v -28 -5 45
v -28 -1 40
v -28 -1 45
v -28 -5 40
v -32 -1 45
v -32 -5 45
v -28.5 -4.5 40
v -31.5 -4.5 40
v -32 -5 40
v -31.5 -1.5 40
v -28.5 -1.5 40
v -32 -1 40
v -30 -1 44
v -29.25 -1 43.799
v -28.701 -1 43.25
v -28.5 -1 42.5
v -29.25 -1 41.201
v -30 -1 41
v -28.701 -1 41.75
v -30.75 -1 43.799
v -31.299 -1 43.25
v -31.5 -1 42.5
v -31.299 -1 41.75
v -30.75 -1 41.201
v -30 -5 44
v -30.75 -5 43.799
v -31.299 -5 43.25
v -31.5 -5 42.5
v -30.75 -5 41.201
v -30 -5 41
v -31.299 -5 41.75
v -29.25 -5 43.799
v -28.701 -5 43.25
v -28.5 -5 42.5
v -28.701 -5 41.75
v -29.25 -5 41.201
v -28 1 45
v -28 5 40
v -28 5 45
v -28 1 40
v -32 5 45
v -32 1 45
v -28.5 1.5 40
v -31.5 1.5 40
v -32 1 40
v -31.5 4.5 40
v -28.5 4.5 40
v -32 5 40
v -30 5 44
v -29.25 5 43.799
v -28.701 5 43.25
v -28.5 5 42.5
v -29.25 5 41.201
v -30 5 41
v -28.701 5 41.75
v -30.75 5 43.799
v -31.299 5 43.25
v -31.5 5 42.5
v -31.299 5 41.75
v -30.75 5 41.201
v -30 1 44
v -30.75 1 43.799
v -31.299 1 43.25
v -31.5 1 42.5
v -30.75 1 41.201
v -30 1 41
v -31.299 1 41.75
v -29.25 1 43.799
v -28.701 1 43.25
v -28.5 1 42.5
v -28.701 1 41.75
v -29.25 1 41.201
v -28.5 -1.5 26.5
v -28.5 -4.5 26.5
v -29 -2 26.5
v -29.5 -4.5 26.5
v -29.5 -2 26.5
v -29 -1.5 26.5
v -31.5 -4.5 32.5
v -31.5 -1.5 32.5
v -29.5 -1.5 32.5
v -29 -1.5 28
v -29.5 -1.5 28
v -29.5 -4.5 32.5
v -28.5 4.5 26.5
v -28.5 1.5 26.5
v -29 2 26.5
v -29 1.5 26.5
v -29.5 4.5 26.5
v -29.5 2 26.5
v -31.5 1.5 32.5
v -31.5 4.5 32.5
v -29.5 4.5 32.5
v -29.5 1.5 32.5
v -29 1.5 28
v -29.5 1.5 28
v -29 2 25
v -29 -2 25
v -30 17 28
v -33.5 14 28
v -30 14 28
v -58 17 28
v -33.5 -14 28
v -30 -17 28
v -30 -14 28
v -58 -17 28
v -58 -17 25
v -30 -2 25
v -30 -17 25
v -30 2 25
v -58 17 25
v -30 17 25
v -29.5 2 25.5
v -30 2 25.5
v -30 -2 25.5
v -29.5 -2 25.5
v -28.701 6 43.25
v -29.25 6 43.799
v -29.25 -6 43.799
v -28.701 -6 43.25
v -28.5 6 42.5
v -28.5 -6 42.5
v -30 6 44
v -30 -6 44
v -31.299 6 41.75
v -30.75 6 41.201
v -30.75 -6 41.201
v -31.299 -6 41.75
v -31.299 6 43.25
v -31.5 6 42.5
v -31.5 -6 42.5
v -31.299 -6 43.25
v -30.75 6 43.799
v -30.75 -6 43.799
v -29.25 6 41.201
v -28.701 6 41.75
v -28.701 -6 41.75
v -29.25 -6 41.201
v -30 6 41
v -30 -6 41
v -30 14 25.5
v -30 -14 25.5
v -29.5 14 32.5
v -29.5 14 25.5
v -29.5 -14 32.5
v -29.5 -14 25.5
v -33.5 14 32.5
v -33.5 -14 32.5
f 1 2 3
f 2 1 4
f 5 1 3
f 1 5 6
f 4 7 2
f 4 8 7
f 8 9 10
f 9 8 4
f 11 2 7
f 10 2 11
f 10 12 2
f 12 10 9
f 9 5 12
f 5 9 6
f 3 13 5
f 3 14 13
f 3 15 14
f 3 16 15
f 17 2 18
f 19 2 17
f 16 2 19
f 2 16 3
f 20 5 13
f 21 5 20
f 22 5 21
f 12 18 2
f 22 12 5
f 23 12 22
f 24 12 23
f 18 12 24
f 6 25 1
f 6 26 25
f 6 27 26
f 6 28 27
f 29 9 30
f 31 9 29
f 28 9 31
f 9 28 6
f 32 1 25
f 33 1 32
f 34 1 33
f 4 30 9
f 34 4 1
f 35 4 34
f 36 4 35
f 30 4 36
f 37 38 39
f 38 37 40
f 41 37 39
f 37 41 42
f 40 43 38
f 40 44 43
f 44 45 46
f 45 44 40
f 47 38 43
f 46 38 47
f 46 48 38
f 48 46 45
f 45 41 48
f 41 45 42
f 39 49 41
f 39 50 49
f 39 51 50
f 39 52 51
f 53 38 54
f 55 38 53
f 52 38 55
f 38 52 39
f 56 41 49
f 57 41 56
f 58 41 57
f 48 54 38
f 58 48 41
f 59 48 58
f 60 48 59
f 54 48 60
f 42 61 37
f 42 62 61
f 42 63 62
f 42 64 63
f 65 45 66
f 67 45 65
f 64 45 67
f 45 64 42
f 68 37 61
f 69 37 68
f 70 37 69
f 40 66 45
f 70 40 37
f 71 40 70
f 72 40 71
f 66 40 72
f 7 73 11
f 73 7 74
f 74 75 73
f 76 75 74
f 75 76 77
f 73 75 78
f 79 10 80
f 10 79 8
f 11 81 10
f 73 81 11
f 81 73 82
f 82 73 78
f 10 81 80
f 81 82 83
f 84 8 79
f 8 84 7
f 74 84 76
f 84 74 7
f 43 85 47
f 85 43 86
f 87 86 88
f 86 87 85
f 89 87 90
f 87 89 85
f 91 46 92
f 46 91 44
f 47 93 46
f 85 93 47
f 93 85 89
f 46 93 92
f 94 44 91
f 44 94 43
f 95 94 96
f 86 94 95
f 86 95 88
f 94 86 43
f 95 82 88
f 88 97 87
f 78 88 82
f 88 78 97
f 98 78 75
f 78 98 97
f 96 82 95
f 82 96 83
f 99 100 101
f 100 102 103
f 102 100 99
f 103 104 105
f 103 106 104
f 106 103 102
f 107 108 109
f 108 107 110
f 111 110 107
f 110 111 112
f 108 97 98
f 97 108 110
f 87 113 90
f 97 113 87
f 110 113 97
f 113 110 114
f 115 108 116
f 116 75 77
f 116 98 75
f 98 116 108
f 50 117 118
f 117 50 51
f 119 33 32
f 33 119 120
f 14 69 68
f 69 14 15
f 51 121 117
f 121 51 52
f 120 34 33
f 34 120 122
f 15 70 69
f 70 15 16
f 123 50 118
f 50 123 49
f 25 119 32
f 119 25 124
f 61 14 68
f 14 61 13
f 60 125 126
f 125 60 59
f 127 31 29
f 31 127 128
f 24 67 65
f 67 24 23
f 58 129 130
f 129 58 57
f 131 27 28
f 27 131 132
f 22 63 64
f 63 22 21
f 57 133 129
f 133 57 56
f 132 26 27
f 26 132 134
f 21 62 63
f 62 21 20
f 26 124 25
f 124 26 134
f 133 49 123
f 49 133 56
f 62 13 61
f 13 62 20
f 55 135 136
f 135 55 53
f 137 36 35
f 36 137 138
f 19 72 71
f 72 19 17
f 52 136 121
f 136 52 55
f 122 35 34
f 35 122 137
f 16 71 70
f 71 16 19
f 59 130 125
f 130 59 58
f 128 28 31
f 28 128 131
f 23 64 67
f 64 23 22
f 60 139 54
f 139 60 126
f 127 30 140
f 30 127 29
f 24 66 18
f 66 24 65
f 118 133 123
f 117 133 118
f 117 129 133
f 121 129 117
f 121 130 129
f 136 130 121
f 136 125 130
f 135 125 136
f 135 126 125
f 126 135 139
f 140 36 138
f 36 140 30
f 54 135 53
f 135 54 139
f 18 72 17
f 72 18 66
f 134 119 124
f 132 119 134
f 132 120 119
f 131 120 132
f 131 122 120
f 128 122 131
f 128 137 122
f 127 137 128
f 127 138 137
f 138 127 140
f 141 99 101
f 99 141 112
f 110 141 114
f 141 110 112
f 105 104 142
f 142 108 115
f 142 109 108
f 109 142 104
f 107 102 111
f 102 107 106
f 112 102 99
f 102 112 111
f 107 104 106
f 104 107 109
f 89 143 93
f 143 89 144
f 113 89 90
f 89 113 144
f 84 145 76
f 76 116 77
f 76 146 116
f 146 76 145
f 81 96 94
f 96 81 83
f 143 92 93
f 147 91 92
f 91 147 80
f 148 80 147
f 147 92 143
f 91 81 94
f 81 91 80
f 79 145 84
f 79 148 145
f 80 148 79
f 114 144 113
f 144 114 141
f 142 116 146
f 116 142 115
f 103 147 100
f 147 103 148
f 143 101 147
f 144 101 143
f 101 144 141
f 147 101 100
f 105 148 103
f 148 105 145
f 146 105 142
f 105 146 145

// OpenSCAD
// file: utils.scad
include <parameters.scad>

module beamBetween(p1, p2, width, height) {
    dx = p2[0] - p1[0];
    dz = p2[2] - p1[2];
    length = sqrt(dx * dx + dz * dz);
    angle = atan2(dz, dx);

    translate([(p1[0] + p2[0]) / 2, (p1[1] + p2[1]) / 2, (p1[2] + p2[2]) / 2])
        rotate([0, -angle, 0])
            cube([length, width, height], center = true);
}
// file: footrest.scad
include <parameters.scad>
use <utils.scad>

//================ FOOTREST =================//
// Folding footrest: one continuous aluminum plate hinged at the end of the
// L-bracket arm. Lightweight aluminum construction.

module footrest() {
    halfL = footrestLength / 2;
    cx = footrestFrontX;
    cz = footrestHeight - footrestThickness / 2;

    // Clevis wings at the end of the L-bracket arm.
    for (side = [-1, 1])
        color(matDarkSteel)
            translate([footPivotX, side * 3, footPivotZ])
                cube([4, 4, footrestThickness + 2], center = true);

    // Vertical brackets from arm down to the plate. Aluminum.
    bracketH = footPivotZ - cz;
    for (side = [-1, 1])
        color(matAluminum)
            translate([footPivotX, side * 3, (footPivotZ + cz) / 2])
                cube([3, 3, bracketH], center = true);

    // Folding cleat behind the plate rear edge.
    color(matAluminum)
        translate([cx + halfL - 2, 0, cz])
            cube([6, 4, footrestThickness], center = true);

    // Pivot pin through cleat and wings.
    color(matChrome)
        translate([footPivotX, 0, footPivotZ])
            rotate([90, 0, 0])
                cylinder(r = 1.5, h = 12, center = true, $fn = 12);

    // Plate — aluminum.
    color(matAluminum)
        translate([cx, 0, cz])
            cube([footrestLength, footrestWidth, footrestThickness], center = true);

    // Optional heel guard.
    if (footHeelGuard)
        color(matAluminum)
            translate([cx + halfL - 1.5, 0, cz + 2.5])
                cube([4, footrestWidth - 6, 7], center = true);

    // Optional toe guard.
    if (footToeGuard)
        color(matAluminum)
            translate([cx - halfL + 1.5, 0, cz + 3])
                cube([4, footrestWidth - 4, 8], center = true);
}
// file: parameters.scad
// Shared parameters for tracked wheelchair prototype
// NOTE: 1 unit = 1 cm (seat target 450 mm = 45 units above ground).
$fn = 48;

//================ MATERIALS =================//
// Frame: aluminum 6061-T6 (lightweight)
// Seat: carbon fiber T700 + honeycomb (ultralight)
// Suspension: rubber bushings (lightweight)
// Axles: aluminum 7075-T6 (1/3 weight of steel)
matSteel      = [0.35, 0.36, 0.38];   // hardware / fasteners only
matDarkSteel  = [0.25, 0.26, 0.28];
matRubber     = [0.12, 0.12, 0.14];   // track belt + bushings
matAluminum   = [0.55, 0.57, 0.60];   // primary frame material
matChrome     = [0.70, 0.72, 0.75];
matCarbon     = [0.15, 0.15, 0.18];   // (unused — seat now aluminum)
matLeather    = [0.45, 0.25, 0.12];   // leather cushion color

//================ TRACKS =================//
trackLength = 82;
trackWidth = 14;
trackCenterY = 28;

idlerRadius = 10;
idlerX = trackLength / 2;
idlerZ = 16;
roadRadius = 7;
roadZ = 13;  // road wheels roll on the belt's inner surface (belt upper edge at this height)
roadPositions = [-22, -6, 10, 24];

linkLength = 10;
linkWidth = trackWidth + 2;
linkThickness = 3;
linkGap = 1;
// Belt centerline clears the idler wheels plus link half-thickness,
// so the links ride on the wheels instead of clipping through them.
trackRadius = idlerRadius + linkThickness / 2;  // = 11.5
beltThickness = 3;
groundZ = idlerZ - trackRadius;  // bottom of track = ground level (4.5)

//================ HYDRAULIC JACK WHEEL =================//
trackTilt = 0;
liftPivotX = idlerX;
liftPivotZ = idlerZ;
// Electric linear actuator (24V DC, 500kg, 300mm stroke).
// 1/3 weight of hydraulic system.
hydrWheelRadius = 4;
hydrWheelWidth = 10;
hydrBarrelRadius = 4;        // smaller barrel (mini actuator)
hydrBarrelHeight = 12;       // shorter barrel
hydrRodRadius = 2;
// At full extension the jack wheel rests on the ground:
// mountZ 35 - groundZ 4.5 - wheelR 4 = 26.5
hydrExtend = 26.5;
hydrRetracted = 0;
hydrExtendAmount = hydrExtend;
hydrMountX = 10;   // jack mount x; moved forward (from 24) for first-stair clearance
hydrMountY = 0;

//================ CHASSIS =================//
chassisLength = 82;
chassisBottom = 35;
chassisHeight = 12;

//================ SEAT =================//
// Seat geometry: flat aluminium pan + leather cushion + slim backrest.
// Seat surface rides at 450 mm (45 units) above the ground.
// topZ = idlerZ + seatTopOffset = 49.5, ground at 4.5 -> seat 45 above ground.
seatPanLength = 66;
seatPanWidth = 66;
backShellHeight = 72;
headrestHeight = 16;
seatTopOffset = 45 - trackRadius;  // = 33.5
// Backrest recline (deg from vertical).
seatBackRecline = 8;

//================ FOOTREST =================//
footrestWidth = 34;
footrestLength = 28;
footrestThickness = 3;       // 3mm aluminum plate
footrestHeight = idlerZ + 12;
footrestFrontX = -30 - footrestLength / 2;  // plate center, extends forward from arm end

// Folding footplate pivots at the end of the L-bracket arm.
footPivotX = -30;                           // end of L-bracket horizontal arm
footPivotZ = idlerZ + seatTopOffset - 7;    // arm height (panB - 2)
footHeelGuard = true;                       // optional heel guard
footToeGuard = false;                       // optional toe guard (off by default)

//================ ARMRESTS =================//
armPivotX = idlerX - 14;                     // rear post at the seat back
armLength = 68;                              // full-length pad (covers seat depth)
armPadHeight = idlerZ + seatTopOffset + 19;  // pad top = elbow height (~19 above seat top)
armPadWidth = 8;
armPadThick = 4;
// main file
// STL EXPORT: Footrest assembly
include <parameters.scad>
use <footrest.scad>
footrest();
